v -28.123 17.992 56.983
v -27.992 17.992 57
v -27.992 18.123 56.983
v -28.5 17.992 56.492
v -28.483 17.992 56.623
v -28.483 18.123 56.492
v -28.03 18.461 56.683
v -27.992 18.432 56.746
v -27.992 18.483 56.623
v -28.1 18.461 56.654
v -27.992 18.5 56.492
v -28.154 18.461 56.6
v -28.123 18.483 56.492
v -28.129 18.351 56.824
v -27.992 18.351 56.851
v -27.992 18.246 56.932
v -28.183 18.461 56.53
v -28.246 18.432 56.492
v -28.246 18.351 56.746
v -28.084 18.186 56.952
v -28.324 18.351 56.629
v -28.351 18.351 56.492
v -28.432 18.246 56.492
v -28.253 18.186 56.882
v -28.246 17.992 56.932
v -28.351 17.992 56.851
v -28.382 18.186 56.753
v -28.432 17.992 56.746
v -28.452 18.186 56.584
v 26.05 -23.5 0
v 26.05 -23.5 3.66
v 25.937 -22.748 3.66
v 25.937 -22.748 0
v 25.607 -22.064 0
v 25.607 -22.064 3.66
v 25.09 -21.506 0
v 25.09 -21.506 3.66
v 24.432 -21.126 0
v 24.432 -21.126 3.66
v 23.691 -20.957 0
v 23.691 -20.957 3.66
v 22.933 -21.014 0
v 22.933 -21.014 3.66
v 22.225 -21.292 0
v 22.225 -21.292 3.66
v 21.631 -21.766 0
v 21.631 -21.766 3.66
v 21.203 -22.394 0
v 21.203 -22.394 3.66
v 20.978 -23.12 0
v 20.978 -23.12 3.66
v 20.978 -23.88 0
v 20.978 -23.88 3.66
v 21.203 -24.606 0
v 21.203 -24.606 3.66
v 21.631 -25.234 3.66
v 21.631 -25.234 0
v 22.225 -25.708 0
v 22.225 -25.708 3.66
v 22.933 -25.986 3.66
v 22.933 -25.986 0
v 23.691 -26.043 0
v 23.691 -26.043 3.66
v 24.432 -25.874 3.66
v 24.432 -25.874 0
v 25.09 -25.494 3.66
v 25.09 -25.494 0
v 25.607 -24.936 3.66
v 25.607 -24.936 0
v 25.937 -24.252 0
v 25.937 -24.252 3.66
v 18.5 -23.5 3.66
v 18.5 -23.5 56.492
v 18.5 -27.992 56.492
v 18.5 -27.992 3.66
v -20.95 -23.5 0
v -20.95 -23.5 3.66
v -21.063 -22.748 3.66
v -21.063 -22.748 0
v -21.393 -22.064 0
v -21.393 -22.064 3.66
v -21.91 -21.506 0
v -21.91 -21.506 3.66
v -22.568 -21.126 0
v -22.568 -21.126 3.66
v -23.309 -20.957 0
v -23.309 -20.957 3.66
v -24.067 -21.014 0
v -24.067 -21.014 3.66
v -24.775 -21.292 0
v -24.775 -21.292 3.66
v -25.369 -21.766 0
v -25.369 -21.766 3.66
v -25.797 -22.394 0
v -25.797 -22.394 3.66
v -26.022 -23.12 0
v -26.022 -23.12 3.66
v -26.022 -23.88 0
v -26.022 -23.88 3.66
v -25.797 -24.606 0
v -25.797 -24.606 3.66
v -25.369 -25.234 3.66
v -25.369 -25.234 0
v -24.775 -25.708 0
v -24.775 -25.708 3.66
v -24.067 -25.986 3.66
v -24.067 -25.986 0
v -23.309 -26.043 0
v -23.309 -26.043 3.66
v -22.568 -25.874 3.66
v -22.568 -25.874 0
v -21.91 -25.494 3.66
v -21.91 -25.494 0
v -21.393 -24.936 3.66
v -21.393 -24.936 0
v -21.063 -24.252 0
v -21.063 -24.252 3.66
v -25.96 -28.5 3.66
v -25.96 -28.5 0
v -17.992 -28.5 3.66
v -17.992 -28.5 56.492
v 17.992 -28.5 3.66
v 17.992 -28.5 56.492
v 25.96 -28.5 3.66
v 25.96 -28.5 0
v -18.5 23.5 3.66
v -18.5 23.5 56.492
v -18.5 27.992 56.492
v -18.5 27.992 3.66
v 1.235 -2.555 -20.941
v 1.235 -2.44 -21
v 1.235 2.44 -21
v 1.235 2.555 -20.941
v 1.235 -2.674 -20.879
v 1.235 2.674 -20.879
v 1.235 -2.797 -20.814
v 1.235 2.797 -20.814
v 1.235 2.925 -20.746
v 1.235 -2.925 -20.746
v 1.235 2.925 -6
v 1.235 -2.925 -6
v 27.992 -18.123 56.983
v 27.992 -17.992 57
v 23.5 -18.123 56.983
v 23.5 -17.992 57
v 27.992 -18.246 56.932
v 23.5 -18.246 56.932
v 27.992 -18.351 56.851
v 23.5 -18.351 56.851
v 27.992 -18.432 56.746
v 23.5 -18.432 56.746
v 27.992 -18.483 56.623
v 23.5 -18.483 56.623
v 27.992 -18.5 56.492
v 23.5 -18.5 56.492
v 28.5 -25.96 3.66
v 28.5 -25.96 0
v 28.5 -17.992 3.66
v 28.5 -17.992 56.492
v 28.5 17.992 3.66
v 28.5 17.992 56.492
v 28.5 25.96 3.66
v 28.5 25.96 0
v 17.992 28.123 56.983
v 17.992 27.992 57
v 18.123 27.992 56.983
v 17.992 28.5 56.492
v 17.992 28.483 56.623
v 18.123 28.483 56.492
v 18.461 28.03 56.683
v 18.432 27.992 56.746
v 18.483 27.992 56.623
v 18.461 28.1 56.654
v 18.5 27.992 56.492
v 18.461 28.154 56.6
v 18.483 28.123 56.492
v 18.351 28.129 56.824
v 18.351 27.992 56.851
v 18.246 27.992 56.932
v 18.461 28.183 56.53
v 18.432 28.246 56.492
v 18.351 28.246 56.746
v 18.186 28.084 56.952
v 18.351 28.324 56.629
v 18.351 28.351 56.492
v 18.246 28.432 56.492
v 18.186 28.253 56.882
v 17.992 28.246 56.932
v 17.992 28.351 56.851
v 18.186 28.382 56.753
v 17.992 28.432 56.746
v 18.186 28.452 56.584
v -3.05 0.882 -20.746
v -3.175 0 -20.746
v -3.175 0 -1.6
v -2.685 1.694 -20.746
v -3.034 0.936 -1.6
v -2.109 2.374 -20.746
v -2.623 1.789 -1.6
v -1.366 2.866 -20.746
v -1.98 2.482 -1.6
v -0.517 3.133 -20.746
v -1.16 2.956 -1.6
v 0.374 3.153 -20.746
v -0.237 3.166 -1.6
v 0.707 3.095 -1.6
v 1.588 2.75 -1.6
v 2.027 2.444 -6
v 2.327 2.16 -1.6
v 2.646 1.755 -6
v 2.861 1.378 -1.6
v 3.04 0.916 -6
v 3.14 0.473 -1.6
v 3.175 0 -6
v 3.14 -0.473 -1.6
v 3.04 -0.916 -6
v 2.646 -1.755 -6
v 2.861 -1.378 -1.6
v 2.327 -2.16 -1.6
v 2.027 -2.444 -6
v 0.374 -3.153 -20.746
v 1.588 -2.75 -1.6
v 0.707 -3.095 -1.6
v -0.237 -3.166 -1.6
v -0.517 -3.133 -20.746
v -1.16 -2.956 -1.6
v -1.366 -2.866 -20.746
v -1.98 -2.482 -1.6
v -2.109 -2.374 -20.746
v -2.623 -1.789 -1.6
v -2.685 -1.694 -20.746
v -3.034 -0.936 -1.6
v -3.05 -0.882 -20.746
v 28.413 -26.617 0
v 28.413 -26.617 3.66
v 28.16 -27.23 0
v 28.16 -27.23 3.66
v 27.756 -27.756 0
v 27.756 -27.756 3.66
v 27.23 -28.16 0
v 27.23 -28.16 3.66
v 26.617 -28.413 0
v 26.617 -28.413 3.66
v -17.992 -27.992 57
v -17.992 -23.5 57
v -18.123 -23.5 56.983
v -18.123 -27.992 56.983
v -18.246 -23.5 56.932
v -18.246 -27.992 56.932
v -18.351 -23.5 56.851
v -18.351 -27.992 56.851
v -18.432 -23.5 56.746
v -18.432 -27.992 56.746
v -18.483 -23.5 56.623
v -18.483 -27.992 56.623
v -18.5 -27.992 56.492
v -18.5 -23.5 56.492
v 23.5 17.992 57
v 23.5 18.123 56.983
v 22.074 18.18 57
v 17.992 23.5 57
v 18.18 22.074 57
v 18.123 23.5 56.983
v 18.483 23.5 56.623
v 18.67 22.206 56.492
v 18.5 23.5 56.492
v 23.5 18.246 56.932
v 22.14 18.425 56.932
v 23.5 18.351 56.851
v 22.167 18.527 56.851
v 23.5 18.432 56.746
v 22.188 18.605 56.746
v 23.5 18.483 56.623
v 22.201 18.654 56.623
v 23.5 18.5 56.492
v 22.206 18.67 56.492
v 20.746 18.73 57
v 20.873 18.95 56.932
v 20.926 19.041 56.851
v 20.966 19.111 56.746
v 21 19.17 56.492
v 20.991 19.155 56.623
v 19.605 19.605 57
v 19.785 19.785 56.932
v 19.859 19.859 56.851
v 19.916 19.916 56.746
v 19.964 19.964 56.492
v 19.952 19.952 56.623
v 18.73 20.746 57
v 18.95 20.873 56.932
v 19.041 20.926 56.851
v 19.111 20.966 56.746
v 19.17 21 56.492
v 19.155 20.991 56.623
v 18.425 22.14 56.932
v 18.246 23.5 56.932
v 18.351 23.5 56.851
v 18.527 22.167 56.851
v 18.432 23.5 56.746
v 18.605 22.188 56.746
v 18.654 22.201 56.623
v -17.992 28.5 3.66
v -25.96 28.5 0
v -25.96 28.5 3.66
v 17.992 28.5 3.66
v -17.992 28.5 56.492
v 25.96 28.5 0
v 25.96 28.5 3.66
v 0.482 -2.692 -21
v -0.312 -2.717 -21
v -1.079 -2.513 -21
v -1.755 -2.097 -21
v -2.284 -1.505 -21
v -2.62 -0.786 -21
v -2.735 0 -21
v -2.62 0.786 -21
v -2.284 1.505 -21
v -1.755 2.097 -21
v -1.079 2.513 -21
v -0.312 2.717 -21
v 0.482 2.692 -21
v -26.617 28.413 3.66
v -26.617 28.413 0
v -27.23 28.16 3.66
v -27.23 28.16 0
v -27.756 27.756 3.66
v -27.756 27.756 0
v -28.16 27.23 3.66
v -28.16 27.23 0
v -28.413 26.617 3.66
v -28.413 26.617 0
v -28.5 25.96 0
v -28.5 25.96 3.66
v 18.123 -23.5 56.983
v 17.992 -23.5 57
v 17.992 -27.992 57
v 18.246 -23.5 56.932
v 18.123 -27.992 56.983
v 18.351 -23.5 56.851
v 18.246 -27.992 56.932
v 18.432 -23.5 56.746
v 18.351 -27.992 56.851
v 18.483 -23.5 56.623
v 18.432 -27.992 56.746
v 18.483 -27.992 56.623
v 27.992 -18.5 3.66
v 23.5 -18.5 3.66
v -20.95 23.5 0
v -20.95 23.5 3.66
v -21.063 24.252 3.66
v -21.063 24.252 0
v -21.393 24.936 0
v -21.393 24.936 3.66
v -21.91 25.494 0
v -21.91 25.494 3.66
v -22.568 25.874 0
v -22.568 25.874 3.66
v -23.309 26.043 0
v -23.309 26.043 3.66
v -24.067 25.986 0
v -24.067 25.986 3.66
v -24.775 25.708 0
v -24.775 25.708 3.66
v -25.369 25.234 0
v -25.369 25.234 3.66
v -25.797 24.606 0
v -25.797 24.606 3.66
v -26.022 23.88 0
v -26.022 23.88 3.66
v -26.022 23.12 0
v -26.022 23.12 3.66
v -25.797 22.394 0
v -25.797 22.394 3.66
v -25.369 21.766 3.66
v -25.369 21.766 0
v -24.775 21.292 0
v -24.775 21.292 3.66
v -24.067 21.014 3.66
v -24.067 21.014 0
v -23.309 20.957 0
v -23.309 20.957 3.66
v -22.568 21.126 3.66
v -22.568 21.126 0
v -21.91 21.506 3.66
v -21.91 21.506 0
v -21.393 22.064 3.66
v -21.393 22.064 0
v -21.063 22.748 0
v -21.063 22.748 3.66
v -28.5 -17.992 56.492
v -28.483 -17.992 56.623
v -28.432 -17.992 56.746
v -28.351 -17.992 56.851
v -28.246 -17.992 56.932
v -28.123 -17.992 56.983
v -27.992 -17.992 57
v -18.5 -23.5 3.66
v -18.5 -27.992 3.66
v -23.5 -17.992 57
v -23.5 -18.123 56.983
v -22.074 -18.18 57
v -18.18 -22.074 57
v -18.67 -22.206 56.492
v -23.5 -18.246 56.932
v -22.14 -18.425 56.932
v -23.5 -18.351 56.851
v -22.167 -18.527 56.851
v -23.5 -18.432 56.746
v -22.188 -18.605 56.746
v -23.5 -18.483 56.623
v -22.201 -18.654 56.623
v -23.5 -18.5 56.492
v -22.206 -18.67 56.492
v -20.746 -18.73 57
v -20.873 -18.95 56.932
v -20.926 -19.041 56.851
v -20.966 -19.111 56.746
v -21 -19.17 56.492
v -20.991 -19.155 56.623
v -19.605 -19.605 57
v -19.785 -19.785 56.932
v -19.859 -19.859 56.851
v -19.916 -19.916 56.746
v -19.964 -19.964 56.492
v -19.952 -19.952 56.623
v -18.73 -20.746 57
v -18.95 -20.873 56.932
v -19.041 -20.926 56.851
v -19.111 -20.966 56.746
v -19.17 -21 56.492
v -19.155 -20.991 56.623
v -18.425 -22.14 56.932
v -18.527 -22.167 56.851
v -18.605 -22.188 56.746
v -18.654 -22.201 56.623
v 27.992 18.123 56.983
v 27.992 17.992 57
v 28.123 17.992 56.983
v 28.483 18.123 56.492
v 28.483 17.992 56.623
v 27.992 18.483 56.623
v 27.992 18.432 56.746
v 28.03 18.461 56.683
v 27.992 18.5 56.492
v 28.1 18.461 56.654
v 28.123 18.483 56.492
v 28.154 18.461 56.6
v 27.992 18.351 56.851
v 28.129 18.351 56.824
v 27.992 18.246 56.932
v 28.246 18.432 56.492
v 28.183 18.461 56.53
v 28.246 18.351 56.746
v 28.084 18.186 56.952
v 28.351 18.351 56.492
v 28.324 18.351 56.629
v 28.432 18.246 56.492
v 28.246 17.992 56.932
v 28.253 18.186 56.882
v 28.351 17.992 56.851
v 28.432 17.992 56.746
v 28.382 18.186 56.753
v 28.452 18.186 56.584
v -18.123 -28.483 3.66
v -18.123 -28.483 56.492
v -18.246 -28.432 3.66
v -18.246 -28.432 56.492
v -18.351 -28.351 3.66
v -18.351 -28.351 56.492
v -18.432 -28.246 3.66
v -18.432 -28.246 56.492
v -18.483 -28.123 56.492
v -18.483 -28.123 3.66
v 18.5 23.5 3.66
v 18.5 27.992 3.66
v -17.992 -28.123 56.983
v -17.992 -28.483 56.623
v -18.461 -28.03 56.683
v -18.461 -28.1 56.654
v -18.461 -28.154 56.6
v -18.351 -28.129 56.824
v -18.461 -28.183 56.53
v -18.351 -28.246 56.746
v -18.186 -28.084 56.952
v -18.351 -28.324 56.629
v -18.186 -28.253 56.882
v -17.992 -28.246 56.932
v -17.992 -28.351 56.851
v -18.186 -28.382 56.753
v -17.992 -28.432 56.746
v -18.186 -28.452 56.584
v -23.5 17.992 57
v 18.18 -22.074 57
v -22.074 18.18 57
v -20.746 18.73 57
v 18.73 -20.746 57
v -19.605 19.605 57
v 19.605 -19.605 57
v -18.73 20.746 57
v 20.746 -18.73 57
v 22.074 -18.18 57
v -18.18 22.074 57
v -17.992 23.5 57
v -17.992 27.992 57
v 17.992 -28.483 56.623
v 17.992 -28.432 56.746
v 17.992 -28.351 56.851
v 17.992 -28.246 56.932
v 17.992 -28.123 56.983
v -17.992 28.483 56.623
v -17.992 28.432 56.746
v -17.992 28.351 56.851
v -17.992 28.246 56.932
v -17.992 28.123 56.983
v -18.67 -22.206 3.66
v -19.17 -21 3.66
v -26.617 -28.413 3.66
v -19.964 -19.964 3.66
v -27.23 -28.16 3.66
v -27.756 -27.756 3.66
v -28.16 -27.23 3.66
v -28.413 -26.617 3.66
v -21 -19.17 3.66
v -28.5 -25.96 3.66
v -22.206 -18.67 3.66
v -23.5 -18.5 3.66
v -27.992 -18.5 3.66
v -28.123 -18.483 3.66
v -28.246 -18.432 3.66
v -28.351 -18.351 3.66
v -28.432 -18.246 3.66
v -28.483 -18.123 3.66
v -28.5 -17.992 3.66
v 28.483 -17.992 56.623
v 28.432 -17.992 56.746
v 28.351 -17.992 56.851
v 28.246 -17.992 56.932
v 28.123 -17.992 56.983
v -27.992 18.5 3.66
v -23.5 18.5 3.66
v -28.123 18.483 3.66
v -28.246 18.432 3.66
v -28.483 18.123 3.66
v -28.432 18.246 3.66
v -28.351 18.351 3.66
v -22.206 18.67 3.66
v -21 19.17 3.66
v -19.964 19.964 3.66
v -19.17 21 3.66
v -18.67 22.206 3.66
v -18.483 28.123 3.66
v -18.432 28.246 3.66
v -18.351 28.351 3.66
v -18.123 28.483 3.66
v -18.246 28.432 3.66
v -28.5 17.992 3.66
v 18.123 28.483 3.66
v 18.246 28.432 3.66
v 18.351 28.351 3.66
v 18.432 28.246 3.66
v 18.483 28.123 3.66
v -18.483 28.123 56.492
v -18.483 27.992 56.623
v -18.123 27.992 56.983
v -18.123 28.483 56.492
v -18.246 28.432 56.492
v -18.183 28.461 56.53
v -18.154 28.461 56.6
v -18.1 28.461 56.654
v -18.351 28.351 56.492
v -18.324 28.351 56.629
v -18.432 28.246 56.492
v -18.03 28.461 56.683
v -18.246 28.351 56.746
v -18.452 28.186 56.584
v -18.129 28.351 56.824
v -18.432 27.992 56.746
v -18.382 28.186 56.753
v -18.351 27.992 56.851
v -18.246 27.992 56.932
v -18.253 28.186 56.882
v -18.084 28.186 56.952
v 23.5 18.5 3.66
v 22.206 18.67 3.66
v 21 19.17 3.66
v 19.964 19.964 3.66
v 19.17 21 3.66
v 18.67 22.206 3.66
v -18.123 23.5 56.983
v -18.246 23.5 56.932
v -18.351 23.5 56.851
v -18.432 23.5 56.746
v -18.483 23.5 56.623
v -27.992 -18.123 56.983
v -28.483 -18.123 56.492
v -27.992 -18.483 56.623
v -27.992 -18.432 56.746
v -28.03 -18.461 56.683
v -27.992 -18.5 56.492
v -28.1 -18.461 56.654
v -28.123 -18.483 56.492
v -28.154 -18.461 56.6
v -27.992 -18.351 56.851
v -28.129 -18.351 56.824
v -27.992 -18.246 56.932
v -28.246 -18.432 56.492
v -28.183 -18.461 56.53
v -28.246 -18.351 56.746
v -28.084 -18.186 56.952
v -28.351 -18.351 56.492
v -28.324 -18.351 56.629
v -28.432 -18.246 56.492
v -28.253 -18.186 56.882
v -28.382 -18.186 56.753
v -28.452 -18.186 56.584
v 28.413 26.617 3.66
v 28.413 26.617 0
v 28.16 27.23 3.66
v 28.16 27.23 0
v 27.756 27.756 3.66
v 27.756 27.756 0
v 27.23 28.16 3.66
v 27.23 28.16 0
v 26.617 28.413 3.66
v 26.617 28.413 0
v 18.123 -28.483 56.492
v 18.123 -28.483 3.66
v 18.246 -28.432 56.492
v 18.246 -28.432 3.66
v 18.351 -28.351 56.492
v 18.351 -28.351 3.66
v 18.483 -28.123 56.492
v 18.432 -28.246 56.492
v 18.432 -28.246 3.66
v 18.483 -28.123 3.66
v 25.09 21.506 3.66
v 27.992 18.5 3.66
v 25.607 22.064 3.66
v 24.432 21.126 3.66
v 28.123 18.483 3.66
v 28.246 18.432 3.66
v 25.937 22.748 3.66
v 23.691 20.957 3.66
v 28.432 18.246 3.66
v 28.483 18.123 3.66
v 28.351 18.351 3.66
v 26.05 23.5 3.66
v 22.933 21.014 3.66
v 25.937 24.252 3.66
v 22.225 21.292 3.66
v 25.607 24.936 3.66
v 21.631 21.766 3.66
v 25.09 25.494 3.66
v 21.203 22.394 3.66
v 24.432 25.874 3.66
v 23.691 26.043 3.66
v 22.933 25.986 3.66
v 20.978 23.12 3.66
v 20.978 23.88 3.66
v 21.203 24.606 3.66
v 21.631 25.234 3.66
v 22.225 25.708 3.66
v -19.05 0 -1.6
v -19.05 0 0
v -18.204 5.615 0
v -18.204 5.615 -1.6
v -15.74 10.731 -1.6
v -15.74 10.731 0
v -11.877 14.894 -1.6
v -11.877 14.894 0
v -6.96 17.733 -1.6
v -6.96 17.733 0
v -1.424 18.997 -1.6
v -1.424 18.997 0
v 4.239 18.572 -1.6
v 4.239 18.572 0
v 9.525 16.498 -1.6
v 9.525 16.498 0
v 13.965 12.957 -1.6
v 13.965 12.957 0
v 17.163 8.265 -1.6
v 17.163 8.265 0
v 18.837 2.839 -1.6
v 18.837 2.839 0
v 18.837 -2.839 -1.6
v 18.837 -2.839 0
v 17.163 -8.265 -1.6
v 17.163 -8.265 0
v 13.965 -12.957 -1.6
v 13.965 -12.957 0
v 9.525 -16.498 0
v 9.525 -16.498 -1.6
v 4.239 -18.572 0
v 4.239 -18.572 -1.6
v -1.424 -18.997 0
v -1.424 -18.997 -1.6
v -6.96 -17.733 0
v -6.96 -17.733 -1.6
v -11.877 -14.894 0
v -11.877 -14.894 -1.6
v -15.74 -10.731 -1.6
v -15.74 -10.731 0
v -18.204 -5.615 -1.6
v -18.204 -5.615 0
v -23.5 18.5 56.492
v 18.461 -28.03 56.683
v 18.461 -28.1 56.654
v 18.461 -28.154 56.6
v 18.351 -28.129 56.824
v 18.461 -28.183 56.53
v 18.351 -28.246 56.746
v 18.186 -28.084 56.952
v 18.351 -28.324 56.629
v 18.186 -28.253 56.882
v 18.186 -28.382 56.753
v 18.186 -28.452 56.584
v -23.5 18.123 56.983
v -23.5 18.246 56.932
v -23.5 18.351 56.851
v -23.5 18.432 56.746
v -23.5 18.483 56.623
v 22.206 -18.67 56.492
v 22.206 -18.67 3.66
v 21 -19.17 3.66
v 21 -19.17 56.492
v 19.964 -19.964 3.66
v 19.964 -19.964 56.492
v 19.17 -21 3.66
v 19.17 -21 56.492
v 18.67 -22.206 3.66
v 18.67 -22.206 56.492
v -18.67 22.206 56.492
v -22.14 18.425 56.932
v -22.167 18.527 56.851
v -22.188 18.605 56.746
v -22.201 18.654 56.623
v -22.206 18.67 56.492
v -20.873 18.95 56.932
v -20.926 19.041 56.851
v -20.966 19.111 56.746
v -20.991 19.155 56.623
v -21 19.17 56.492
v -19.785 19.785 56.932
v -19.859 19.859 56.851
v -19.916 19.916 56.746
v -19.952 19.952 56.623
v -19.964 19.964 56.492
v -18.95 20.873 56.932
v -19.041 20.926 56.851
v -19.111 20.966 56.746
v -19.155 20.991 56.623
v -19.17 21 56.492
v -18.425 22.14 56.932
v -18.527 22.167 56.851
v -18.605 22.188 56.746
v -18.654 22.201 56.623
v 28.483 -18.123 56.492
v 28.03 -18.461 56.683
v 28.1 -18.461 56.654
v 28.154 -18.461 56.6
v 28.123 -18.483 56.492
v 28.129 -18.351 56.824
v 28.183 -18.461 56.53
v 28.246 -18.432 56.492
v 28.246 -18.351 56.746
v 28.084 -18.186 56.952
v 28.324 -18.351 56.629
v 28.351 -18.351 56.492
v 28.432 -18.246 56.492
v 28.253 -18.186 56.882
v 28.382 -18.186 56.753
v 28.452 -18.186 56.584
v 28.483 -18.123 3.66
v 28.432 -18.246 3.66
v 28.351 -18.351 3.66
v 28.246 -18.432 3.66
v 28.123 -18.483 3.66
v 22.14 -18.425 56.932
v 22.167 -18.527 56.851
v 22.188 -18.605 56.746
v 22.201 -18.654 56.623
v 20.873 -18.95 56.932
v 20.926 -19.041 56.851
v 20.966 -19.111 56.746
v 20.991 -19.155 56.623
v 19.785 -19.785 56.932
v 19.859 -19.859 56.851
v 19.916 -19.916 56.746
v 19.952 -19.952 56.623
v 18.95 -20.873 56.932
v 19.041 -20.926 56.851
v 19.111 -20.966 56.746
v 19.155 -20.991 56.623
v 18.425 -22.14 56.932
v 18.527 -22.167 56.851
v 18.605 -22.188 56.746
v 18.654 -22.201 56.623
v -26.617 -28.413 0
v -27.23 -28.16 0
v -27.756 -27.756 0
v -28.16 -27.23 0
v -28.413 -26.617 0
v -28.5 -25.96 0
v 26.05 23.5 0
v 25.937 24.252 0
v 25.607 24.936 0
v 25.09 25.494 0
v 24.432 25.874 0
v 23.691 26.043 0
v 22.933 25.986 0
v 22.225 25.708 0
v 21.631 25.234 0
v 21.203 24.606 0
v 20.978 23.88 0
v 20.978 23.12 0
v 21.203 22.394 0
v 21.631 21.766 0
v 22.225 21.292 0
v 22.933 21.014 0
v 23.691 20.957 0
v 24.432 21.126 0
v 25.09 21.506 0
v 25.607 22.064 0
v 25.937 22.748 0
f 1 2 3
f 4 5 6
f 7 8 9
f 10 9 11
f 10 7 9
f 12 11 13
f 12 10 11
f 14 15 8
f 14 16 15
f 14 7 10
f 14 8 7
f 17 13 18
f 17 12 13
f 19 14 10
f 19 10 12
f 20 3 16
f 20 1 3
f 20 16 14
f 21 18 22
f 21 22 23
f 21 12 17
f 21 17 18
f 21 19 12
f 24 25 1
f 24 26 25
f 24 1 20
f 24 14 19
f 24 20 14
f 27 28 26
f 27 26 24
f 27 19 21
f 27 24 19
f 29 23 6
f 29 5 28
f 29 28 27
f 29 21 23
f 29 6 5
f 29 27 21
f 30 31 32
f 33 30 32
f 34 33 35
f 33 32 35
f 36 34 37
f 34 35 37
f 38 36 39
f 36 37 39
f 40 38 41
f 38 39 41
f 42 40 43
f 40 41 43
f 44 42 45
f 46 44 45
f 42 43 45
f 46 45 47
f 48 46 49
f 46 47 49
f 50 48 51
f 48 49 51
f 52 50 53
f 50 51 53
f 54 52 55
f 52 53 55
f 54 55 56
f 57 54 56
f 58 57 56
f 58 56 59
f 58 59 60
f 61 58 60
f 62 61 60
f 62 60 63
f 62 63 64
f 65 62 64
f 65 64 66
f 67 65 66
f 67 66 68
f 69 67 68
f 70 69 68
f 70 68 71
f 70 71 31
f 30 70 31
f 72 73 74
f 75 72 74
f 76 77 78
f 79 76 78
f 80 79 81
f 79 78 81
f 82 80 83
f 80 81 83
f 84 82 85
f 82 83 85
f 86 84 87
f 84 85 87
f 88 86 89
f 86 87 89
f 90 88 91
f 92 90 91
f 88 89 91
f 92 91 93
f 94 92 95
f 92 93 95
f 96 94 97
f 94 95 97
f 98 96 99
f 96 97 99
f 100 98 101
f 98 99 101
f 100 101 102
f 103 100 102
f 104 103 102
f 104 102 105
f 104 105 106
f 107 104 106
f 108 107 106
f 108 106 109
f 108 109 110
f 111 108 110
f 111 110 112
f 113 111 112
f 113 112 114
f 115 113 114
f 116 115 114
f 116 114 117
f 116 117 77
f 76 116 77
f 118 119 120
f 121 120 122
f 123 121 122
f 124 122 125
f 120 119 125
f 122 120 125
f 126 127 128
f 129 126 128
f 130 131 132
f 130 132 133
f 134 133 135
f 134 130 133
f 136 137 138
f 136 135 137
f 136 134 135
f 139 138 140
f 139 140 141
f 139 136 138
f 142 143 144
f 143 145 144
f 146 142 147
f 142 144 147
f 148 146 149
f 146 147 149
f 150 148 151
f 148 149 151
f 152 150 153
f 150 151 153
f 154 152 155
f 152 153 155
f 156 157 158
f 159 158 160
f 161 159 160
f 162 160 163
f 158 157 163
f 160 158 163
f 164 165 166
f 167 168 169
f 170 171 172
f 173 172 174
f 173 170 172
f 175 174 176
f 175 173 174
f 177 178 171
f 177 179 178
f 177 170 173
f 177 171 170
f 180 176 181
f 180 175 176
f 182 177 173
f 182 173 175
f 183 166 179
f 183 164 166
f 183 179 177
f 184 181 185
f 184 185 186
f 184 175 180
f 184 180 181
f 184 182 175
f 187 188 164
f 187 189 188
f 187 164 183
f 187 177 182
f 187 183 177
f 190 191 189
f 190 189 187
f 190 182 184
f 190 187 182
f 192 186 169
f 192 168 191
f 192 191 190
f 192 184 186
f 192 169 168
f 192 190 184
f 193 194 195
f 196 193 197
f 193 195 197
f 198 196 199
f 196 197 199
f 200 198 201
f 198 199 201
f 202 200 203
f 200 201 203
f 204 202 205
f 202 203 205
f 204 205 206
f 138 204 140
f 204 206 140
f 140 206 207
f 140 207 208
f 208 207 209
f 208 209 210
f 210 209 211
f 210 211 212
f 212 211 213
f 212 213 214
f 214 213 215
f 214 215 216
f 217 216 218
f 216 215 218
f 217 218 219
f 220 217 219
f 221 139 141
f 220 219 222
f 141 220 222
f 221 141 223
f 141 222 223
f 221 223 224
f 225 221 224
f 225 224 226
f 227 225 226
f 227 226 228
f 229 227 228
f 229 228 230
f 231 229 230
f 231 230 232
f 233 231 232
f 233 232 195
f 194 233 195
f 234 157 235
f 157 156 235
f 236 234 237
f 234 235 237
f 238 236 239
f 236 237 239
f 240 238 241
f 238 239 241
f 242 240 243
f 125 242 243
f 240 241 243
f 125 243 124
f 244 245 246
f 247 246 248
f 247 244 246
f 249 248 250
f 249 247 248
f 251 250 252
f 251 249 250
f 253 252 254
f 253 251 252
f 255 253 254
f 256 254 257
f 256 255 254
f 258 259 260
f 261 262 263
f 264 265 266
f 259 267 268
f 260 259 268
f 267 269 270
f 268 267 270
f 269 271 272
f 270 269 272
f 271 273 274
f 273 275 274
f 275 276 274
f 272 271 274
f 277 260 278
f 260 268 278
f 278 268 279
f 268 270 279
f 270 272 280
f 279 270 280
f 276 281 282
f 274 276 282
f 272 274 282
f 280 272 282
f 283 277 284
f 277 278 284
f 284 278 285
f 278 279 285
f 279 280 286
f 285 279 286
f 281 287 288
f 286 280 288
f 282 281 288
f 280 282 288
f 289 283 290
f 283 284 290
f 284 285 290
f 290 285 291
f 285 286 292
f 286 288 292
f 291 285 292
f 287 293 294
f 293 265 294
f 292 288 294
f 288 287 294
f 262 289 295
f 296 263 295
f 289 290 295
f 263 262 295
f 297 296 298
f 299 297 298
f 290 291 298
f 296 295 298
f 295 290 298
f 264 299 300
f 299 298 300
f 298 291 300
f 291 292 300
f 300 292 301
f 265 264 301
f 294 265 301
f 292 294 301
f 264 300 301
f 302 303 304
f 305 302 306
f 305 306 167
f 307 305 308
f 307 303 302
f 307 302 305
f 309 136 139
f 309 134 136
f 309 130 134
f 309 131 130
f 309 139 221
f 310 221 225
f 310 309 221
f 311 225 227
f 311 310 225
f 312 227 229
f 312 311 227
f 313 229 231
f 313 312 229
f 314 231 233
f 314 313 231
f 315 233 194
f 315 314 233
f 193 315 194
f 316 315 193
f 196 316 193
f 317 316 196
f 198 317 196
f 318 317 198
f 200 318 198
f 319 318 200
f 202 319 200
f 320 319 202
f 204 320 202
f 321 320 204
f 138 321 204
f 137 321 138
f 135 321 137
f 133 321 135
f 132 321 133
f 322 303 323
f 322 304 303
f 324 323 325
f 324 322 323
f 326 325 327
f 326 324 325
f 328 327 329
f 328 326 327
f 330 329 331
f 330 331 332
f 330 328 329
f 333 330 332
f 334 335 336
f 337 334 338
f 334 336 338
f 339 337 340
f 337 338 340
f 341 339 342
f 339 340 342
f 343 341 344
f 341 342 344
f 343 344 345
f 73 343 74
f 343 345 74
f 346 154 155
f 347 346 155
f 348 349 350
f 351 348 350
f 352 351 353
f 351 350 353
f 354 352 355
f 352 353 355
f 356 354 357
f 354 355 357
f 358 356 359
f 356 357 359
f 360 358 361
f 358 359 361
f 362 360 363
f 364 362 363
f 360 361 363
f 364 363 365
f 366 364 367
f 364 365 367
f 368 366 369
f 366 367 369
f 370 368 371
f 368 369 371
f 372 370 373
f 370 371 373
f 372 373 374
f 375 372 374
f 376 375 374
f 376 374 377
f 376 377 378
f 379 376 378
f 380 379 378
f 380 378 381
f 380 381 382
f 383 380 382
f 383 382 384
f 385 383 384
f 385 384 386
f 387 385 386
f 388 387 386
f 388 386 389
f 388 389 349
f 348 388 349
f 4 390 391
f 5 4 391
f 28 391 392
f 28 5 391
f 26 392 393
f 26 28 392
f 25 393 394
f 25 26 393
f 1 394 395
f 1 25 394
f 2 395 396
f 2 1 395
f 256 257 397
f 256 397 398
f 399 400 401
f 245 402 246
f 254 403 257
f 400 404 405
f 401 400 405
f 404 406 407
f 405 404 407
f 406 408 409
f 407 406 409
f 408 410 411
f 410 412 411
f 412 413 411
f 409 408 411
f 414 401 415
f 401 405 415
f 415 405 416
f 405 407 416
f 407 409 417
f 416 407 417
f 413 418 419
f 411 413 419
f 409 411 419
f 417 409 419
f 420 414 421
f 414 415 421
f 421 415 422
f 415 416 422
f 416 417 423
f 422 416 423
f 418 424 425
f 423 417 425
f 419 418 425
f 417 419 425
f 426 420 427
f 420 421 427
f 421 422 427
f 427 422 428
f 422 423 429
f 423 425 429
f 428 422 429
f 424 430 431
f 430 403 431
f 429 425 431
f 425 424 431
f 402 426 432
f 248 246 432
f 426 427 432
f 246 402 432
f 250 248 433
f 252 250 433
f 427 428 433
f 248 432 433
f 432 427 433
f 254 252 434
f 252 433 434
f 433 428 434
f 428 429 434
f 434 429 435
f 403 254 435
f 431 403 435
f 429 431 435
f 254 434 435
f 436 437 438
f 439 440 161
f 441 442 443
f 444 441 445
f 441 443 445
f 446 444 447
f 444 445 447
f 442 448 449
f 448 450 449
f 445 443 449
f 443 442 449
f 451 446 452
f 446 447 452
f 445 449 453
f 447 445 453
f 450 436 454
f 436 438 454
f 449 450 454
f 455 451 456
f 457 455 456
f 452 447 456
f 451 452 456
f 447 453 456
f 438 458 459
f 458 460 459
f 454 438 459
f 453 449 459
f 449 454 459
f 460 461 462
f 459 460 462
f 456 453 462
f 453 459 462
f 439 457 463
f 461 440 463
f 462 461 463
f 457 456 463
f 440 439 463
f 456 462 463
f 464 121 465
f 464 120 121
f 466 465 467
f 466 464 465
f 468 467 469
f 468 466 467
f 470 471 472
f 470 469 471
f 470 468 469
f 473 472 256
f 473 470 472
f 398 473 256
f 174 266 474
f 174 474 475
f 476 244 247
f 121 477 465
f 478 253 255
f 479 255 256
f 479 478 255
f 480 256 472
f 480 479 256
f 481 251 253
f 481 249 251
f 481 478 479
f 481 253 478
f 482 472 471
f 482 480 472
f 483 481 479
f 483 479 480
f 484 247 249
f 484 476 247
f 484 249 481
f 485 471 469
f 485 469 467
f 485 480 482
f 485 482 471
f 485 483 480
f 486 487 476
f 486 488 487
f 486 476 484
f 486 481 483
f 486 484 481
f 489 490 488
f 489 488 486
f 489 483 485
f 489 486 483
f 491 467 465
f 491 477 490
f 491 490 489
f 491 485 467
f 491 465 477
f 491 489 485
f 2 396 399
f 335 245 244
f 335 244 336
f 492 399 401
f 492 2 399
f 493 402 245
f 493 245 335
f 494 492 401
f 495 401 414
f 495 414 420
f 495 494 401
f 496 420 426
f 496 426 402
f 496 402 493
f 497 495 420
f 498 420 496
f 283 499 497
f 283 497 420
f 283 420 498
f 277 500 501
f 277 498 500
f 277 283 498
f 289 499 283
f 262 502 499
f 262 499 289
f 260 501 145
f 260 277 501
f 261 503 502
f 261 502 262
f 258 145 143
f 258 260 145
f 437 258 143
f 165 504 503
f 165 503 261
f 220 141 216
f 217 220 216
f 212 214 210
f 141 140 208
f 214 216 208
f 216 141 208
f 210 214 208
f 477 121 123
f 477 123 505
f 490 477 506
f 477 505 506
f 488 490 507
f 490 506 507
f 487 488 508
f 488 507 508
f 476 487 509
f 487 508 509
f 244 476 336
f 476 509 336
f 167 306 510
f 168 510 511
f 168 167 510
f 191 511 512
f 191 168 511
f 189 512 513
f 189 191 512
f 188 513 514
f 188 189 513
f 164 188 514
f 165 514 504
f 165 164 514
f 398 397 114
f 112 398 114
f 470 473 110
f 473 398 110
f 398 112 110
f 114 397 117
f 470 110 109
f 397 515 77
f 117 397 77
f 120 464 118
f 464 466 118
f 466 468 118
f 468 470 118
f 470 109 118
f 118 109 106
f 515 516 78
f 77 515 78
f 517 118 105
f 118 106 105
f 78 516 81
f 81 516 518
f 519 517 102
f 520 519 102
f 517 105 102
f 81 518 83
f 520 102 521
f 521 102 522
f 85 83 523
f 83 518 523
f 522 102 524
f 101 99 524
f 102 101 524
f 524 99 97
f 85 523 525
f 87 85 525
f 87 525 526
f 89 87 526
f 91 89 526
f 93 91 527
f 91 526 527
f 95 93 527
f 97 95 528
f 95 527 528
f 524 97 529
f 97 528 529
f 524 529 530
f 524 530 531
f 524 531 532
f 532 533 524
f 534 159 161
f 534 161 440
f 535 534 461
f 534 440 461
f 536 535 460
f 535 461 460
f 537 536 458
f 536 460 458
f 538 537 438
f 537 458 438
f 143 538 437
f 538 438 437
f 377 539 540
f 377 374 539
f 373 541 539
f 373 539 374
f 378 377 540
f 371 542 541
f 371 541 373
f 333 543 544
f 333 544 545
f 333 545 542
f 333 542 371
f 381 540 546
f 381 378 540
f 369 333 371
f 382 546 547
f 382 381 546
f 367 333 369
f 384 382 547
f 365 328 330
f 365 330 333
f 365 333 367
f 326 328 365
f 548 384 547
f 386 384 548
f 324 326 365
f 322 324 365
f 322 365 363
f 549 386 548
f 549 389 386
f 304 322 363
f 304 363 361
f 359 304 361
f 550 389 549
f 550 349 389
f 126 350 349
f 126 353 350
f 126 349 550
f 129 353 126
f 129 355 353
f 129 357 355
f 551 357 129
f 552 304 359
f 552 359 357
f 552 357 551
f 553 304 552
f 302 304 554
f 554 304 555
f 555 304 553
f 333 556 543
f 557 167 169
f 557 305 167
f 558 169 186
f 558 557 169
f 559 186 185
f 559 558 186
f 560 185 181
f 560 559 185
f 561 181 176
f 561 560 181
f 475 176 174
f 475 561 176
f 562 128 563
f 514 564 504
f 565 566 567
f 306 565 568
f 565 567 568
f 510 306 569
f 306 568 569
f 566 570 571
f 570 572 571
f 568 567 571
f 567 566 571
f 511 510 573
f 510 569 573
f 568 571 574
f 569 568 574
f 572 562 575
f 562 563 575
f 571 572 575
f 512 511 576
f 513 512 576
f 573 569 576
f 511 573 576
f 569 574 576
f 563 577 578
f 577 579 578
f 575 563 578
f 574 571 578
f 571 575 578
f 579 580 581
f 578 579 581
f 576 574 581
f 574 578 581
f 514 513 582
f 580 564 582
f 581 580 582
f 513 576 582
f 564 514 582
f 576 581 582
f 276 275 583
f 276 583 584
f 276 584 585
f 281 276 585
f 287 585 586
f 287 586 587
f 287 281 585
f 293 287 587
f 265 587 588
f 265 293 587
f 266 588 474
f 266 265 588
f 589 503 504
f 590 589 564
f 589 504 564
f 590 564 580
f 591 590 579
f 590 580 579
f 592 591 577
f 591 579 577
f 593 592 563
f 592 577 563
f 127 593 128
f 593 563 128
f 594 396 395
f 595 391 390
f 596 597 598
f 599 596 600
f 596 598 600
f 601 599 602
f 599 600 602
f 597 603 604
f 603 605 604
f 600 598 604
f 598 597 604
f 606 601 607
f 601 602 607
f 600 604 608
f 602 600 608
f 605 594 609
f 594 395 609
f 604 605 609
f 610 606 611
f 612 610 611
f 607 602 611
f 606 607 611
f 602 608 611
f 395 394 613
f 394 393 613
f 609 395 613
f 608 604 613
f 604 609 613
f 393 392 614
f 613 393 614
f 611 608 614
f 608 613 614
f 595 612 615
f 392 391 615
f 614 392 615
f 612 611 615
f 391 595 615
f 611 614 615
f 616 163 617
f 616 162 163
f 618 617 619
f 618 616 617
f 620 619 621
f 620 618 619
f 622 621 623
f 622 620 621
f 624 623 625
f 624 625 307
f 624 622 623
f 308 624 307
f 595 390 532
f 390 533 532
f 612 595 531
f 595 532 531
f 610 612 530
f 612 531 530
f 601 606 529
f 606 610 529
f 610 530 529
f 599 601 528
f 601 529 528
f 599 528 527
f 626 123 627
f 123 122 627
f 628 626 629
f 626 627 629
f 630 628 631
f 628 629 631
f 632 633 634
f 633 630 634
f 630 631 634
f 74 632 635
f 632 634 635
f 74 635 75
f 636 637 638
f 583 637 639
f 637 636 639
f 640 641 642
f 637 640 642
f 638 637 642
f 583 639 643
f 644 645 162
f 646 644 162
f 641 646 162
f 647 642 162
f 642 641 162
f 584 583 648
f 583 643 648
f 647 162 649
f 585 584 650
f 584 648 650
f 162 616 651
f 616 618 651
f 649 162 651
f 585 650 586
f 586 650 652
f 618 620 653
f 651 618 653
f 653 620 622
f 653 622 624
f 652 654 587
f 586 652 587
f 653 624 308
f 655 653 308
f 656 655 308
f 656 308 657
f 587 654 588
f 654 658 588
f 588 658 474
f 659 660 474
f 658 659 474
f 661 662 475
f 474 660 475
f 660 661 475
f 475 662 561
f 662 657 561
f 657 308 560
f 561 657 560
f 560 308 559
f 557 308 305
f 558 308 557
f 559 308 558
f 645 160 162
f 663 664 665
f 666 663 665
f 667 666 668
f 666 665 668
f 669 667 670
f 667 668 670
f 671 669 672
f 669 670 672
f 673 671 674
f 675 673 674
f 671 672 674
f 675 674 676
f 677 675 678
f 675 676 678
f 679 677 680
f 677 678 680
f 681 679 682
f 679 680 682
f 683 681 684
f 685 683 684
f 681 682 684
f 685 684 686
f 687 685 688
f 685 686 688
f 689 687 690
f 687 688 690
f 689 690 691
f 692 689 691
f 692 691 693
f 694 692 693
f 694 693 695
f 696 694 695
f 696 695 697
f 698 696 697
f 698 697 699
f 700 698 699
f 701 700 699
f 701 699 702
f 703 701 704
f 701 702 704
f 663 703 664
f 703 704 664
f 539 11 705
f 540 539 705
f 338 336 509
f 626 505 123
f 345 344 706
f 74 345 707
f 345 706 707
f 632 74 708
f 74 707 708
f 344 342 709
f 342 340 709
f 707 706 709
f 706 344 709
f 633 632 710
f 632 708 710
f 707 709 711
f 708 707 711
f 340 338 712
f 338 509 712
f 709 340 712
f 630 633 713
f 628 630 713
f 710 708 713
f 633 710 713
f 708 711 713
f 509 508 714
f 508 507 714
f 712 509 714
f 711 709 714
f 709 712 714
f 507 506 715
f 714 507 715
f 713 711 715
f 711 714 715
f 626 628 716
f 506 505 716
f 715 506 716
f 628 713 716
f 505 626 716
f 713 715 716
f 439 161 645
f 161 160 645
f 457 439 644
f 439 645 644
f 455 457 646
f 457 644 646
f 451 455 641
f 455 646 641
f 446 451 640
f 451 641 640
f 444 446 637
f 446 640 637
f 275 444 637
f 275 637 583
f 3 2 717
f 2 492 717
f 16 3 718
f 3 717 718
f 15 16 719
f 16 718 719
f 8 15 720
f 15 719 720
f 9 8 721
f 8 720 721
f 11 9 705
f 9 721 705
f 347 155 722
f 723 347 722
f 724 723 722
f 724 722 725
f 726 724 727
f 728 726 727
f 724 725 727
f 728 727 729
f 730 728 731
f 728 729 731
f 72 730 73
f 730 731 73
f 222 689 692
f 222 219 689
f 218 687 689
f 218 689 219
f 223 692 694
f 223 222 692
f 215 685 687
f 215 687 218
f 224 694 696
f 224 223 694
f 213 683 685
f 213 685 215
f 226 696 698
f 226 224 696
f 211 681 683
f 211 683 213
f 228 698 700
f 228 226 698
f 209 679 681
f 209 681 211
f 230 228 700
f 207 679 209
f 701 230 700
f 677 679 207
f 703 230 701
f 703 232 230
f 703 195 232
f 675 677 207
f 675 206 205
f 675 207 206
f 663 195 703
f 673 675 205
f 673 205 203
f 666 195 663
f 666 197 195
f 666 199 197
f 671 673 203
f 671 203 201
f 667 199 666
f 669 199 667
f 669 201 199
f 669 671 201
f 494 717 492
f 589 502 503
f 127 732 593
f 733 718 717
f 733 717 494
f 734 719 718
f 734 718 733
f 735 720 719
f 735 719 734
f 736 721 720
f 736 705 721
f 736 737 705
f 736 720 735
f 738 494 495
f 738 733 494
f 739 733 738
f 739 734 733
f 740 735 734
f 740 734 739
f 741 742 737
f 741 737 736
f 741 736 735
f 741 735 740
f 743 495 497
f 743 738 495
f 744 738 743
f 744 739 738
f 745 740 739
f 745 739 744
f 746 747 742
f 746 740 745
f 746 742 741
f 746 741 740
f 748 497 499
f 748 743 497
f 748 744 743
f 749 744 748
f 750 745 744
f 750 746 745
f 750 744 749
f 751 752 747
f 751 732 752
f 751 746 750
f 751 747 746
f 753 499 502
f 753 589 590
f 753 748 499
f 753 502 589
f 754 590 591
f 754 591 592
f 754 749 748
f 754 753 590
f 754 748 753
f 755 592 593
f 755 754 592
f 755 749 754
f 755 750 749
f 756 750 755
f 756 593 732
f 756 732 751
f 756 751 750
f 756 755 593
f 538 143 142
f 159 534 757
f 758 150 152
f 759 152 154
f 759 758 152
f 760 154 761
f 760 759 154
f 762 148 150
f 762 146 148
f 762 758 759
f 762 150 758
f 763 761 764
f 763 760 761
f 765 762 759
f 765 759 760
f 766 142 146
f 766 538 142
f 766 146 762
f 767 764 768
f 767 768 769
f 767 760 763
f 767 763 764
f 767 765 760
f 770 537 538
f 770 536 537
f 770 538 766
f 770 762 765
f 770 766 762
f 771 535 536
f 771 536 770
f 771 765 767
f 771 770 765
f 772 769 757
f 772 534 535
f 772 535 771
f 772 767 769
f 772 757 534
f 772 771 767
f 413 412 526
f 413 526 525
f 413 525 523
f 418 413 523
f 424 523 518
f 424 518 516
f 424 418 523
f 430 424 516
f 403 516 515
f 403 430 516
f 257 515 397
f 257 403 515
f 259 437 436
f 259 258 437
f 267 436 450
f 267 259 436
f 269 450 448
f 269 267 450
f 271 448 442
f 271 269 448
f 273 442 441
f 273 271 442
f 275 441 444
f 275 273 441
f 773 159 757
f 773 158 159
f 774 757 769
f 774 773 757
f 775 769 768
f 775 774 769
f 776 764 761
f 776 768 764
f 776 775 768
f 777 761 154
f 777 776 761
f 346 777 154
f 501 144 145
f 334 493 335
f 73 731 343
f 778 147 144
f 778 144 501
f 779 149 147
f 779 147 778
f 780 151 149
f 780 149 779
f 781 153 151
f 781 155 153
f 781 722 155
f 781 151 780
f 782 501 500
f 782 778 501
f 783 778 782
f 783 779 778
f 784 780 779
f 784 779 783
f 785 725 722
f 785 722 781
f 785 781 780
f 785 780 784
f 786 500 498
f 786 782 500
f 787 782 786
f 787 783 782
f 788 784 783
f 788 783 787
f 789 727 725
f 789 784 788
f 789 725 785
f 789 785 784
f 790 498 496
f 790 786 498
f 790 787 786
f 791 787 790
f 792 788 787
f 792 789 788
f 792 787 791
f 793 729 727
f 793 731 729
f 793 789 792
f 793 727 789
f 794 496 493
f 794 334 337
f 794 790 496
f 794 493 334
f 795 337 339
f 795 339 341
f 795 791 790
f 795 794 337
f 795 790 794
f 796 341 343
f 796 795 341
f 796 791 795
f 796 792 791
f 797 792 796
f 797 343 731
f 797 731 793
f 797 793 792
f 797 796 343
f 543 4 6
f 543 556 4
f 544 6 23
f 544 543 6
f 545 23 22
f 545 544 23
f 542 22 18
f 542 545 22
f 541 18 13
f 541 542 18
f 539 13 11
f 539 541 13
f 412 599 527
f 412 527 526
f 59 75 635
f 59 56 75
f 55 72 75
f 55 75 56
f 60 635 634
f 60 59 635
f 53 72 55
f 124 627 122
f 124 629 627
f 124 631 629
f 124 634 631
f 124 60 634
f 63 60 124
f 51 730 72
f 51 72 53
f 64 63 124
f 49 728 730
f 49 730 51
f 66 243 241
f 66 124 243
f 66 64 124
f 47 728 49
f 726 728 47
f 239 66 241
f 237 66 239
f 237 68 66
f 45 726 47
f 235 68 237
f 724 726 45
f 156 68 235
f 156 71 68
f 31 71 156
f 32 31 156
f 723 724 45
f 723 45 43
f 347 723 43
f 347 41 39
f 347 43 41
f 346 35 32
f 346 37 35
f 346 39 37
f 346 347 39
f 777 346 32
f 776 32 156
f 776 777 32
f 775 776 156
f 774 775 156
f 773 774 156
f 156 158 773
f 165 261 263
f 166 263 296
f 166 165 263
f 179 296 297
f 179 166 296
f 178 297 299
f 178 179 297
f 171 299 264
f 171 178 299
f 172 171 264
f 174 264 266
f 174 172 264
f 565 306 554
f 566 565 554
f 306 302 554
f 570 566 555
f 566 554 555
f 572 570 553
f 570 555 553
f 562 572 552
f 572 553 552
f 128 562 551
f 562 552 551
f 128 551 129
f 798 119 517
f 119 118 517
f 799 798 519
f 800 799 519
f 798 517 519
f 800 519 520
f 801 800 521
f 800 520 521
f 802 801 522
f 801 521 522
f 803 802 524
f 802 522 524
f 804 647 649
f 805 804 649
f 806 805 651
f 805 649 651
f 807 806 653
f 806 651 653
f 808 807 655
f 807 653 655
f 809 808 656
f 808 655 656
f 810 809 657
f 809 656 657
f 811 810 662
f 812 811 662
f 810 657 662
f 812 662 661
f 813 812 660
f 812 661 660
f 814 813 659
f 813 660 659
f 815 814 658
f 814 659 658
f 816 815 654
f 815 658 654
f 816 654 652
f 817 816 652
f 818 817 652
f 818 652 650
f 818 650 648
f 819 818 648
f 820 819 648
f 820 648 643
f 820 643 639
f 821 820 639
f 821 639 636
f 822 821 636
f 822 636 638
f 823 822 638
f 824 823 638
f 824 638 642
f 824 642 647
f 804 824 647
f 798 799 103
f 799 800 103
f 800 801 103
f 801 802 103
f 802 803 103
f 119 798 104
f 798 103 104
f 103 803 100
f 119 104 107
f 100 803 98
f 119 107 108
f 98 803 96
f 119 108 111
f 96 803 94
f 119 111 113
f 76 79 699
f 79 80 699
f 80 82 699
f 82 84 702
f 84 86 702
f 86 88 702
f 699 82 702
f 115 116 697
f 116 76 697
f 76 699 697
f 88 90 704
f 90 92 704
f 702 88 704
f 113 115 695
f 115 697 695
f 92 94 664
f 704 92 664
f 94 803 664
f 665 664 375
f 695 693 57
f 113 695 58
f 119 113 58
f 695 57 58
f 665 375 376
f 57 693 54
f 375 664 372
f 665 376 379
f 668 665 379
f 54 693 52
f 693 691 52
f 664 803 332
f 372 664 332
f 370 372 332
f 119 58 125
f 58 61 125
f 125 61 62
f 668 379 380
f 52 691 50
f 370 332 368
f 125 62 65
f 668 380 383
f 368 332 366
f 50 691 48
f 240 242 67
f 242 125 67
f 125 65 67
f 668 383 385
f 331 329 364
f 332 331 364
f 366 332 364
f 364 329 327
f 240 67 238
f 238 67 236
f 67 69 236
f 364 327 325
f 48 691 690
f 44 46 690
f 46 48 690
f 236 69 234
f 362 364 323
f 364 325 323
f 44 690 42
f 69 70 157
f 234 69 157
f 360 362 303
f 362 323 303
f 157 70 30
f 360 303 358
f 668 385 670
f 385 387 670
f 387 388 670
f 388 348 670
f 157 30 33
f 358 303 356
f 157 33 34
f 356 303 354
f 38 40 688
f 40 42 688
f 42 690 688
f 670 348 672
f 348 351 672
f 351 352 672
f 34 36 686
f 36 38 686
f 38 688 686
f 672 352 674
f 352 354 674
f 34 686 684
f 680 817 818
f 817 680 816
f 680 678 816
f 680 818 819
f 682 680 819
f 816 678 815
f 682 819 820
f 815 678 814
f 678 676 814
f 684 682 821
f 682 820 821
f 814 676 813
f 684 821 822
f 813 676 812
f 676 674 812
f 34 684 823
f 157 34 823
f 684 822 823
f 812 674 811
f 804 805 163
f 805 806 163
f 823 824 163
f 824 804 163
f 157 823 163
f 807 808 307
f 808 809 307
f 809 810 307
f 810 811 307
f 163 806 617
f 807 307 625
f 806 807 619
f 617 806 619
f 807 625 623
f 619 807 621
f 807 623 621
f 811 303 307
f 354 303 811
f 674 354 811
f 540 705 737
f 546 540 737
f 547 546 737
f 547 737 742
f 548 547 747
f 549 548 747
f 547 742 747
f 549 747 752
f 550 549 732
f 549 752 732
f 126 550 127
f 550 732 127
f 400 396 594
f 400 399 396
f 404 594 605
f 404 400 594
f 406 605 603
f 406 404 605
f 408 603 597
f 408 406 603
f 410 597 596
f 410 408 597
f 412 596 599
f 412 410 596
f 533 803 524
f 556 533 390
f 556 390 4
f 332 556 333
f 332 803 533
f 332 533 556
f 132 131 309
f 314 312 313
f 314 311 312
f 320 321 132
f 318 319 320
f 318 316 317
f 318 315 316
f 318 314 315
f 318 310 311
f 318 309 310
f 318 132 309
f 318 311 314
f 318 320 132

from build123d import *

# Parameters (mm, degrees)
SKETCH1_W           = 57
SKETCH1_H           = 57
BOSS_EXTRUDE1_DEPTH = 57
SKETCH2_R           = 2.55
CUT_EXTRUDE1_DEPTH  = 58
CUT_EXTRUDE2_DEPTH  = 53.34
SKETCH4_R           = 19.05
BOSS_EXTRUDE2_DEPTH = 1.6
SKETCH5_R           = 3.175
BOSS_EXTRUDE3_DEPTH = 19.4
CUT_EXTRUDE3_DEPTH  = 15
CHAMFER1_SIZE2      = 0.439940905
CHAMFER1_SIZE       = 0.254
FILLET1_R           = 2.54
FILLET2_R           = 0.508


with BuildPart() as part:
    # Sketch1 → Boss-Extrude1 (new body)
    with BuildSketch(Plane.XY):
        Rectangle(SKETCH1_W, SKETCH1_H)
    extrude(amount=BOSS_EXTRUDE1_DEPTH)

    # Sketch2 → Cut-Extrude1 (cut, through all)
    with BuildSketch(Plane.XY.offset(57)):
        with Locations((-23.5, 23.5)):
            Circle(SKETCH2_R)
        with Locations((23.5, 23.5)):
            Circle(SKETCH2_R)
        with Locations((23.5, -23.5)):
            Circle(SKETCH2_R)
        with Locations((-23.5, -23.5)):
            Circle(SKETCH2_R)
    extrude(amount=-CUT_EXTRUDE1_DEPTH, mode=Mode.SUBTRACT)

    # Sketch3 → Cut-Extrude2 (cut)
    with BuildSketch(Plane.XY.offset(57)):
        with BuildLine():
            Line((-18.5, 23.5), (-18.5, 28.5))
            Line((-18.5, 28.5), (-28.5, 28.5))
            Line((-28.5, 28.5), (-28.5, 18.5))
            Line((-28.5, 18.5), (-23.5, 18.5))
            ThreePointArc((-23.5, 18.5), (-19.964466094, 19.964466094), (-18.5, 23.5))
        make_face()
        with BuildLine():
            Line((28.5, 28.5), (28.5, 18.5))
            Line((28.5, 18.5), (23.5, 18.5))
            ThreePointArc((23.5, 18.5), (19.964466094, 19.964466094), (18.5, 23.5))
            Line((18.5, 23.5), (18.5, 28.5))
            Line((18.5, 28.5), (28.5, 28.5))
        make_face()
        with BuildLine():
            Line((-28.5, -28.5), (-28.5, -18.5))
            Line((-28.5, -18.5), (-23.5, -18.5))
            ThreePointArc((-23.5, -18.5), (-19.964466094, -19.964466094), (-18.5, -23.5))
            Line((-18.5, -23.5), (-18.5, -28.5))
            Line((-18.5, -28.5), (-28.5, -28.5))
        make_face()
        with BuildLine():
            Line((18.5, -23.5), (18.5, -28.5))
            Line((18.5, -28.5), (28.5, -28.5))
            Line((28.5, -28.5), (28.5, -18.5))
            Line((28.5, -18.5), (23.5, -18.5))
            ThreePointArc((23.5, -18.5), (19.964466094, -19.964466094), (18.5, -23.5))
        make_face()
    extrude(amount=-CUT_EXTRUDE2_DEPTH, mode=Mode.SUBTRACT)

    # Sketch4 → Boss-Extrude2 (add)
    with BuildSketch(Plane(origin=(0, 0, 0), x_dir=(-1, 0, 0), z_dir=(0, 0, -1))):
        Circle(SKETCH4_R)
    extrude(amount=BOSS_EXTRUDE2_DEPTH)

    # Sketch5 → Boss-Extrude3 (add)
    with BuildSketch(Plane(origin=(0, 0, -1.6), x_dir=(-1, 0, 0), z_dir=(0, 0, -1))):
        Circle(SKETCH5_R)
    extrude(amount=BOSS_EXTRUDE3_DEPTH)

    # Sketch7 → Cut-Extrude3 (cut)
    with BuildSketch(Plane(origin=(0, 0, -21), x_dir=(-1, 0, 0), z_dir=(0, 0, -1))):
        with BuildLine():
            Line((-1.234908904, 2.925), (-1.234908904, -2.925))
            ThreePointArc((-1.234908904, -2.925), (-3.175, 0), (-1.234908904, 2.925))
        make_face()
    extrude(amount=-CUT_EXTRUDE3_DEPTH, mode=Mode.SUBTRACT)

    # Chamfer1
    chamfer1_edges = [part.edges().sort_by_distance(p)[0] for p in [
        (-1.754962853, -2.645889337, -21),
    ]]
    chamfer(chamfer1_edges, length=CHAMFER1_SIZE, length2=CHAMFER1_SIZE2)

    # Fillet1
    fillet1_edges = [part.edges().sort_by_distance(p)[0] for p in [
        (-28.5, 28.5, 1.83),
        (28.5, -28.5, 1.83),
        (-28.5, -28.5, 1.83),
        (28.5, 28.5, 1.83),
    ]]
    fillet(fillet1_edges, radius=FILLET1_R)

    # Fillet2
    fillet2_edges = [part.edges().sort_by_distance(p)[0] for p in [
        (-28.5, 0, 57),
        (-19.964466094, 19.964466094, 57),
        (-18.5, 26, 57),
        (-26, 18.5, 57),
        (-28.5, 18.5, 30.33),
        (-18.5, 28.5, 30.33),
        (0, -28.5, 57),
        (28.5, 0, 57),
        (0, 28.5, 57),
        (19.964466094, 19.964466094, 57),
        (26, 18.5, 57),
        (18.5, 26, 57),
        (18.5, 28.5, 30.33),
        (28.5, 18.5, 30.33),
        (-19.964466094, -19.964466094, 57),
        (-26, -18.5, 57),
        (-18.5, -26, 57),
        (-18.5, -28.5, 30.33),
        (-28.5, -18.5, 30.33),
        (19.964466094, -19.964466094, 57),
        (18.5, -26, 57),
        (26, -18.5, 57),
        (28.5, -18.5, 30.33),
        (18.5, -28.5, 30.33),
    ]]
    fillet(fillet2_edges, radius=FILLET2_R)


solid = part.part
